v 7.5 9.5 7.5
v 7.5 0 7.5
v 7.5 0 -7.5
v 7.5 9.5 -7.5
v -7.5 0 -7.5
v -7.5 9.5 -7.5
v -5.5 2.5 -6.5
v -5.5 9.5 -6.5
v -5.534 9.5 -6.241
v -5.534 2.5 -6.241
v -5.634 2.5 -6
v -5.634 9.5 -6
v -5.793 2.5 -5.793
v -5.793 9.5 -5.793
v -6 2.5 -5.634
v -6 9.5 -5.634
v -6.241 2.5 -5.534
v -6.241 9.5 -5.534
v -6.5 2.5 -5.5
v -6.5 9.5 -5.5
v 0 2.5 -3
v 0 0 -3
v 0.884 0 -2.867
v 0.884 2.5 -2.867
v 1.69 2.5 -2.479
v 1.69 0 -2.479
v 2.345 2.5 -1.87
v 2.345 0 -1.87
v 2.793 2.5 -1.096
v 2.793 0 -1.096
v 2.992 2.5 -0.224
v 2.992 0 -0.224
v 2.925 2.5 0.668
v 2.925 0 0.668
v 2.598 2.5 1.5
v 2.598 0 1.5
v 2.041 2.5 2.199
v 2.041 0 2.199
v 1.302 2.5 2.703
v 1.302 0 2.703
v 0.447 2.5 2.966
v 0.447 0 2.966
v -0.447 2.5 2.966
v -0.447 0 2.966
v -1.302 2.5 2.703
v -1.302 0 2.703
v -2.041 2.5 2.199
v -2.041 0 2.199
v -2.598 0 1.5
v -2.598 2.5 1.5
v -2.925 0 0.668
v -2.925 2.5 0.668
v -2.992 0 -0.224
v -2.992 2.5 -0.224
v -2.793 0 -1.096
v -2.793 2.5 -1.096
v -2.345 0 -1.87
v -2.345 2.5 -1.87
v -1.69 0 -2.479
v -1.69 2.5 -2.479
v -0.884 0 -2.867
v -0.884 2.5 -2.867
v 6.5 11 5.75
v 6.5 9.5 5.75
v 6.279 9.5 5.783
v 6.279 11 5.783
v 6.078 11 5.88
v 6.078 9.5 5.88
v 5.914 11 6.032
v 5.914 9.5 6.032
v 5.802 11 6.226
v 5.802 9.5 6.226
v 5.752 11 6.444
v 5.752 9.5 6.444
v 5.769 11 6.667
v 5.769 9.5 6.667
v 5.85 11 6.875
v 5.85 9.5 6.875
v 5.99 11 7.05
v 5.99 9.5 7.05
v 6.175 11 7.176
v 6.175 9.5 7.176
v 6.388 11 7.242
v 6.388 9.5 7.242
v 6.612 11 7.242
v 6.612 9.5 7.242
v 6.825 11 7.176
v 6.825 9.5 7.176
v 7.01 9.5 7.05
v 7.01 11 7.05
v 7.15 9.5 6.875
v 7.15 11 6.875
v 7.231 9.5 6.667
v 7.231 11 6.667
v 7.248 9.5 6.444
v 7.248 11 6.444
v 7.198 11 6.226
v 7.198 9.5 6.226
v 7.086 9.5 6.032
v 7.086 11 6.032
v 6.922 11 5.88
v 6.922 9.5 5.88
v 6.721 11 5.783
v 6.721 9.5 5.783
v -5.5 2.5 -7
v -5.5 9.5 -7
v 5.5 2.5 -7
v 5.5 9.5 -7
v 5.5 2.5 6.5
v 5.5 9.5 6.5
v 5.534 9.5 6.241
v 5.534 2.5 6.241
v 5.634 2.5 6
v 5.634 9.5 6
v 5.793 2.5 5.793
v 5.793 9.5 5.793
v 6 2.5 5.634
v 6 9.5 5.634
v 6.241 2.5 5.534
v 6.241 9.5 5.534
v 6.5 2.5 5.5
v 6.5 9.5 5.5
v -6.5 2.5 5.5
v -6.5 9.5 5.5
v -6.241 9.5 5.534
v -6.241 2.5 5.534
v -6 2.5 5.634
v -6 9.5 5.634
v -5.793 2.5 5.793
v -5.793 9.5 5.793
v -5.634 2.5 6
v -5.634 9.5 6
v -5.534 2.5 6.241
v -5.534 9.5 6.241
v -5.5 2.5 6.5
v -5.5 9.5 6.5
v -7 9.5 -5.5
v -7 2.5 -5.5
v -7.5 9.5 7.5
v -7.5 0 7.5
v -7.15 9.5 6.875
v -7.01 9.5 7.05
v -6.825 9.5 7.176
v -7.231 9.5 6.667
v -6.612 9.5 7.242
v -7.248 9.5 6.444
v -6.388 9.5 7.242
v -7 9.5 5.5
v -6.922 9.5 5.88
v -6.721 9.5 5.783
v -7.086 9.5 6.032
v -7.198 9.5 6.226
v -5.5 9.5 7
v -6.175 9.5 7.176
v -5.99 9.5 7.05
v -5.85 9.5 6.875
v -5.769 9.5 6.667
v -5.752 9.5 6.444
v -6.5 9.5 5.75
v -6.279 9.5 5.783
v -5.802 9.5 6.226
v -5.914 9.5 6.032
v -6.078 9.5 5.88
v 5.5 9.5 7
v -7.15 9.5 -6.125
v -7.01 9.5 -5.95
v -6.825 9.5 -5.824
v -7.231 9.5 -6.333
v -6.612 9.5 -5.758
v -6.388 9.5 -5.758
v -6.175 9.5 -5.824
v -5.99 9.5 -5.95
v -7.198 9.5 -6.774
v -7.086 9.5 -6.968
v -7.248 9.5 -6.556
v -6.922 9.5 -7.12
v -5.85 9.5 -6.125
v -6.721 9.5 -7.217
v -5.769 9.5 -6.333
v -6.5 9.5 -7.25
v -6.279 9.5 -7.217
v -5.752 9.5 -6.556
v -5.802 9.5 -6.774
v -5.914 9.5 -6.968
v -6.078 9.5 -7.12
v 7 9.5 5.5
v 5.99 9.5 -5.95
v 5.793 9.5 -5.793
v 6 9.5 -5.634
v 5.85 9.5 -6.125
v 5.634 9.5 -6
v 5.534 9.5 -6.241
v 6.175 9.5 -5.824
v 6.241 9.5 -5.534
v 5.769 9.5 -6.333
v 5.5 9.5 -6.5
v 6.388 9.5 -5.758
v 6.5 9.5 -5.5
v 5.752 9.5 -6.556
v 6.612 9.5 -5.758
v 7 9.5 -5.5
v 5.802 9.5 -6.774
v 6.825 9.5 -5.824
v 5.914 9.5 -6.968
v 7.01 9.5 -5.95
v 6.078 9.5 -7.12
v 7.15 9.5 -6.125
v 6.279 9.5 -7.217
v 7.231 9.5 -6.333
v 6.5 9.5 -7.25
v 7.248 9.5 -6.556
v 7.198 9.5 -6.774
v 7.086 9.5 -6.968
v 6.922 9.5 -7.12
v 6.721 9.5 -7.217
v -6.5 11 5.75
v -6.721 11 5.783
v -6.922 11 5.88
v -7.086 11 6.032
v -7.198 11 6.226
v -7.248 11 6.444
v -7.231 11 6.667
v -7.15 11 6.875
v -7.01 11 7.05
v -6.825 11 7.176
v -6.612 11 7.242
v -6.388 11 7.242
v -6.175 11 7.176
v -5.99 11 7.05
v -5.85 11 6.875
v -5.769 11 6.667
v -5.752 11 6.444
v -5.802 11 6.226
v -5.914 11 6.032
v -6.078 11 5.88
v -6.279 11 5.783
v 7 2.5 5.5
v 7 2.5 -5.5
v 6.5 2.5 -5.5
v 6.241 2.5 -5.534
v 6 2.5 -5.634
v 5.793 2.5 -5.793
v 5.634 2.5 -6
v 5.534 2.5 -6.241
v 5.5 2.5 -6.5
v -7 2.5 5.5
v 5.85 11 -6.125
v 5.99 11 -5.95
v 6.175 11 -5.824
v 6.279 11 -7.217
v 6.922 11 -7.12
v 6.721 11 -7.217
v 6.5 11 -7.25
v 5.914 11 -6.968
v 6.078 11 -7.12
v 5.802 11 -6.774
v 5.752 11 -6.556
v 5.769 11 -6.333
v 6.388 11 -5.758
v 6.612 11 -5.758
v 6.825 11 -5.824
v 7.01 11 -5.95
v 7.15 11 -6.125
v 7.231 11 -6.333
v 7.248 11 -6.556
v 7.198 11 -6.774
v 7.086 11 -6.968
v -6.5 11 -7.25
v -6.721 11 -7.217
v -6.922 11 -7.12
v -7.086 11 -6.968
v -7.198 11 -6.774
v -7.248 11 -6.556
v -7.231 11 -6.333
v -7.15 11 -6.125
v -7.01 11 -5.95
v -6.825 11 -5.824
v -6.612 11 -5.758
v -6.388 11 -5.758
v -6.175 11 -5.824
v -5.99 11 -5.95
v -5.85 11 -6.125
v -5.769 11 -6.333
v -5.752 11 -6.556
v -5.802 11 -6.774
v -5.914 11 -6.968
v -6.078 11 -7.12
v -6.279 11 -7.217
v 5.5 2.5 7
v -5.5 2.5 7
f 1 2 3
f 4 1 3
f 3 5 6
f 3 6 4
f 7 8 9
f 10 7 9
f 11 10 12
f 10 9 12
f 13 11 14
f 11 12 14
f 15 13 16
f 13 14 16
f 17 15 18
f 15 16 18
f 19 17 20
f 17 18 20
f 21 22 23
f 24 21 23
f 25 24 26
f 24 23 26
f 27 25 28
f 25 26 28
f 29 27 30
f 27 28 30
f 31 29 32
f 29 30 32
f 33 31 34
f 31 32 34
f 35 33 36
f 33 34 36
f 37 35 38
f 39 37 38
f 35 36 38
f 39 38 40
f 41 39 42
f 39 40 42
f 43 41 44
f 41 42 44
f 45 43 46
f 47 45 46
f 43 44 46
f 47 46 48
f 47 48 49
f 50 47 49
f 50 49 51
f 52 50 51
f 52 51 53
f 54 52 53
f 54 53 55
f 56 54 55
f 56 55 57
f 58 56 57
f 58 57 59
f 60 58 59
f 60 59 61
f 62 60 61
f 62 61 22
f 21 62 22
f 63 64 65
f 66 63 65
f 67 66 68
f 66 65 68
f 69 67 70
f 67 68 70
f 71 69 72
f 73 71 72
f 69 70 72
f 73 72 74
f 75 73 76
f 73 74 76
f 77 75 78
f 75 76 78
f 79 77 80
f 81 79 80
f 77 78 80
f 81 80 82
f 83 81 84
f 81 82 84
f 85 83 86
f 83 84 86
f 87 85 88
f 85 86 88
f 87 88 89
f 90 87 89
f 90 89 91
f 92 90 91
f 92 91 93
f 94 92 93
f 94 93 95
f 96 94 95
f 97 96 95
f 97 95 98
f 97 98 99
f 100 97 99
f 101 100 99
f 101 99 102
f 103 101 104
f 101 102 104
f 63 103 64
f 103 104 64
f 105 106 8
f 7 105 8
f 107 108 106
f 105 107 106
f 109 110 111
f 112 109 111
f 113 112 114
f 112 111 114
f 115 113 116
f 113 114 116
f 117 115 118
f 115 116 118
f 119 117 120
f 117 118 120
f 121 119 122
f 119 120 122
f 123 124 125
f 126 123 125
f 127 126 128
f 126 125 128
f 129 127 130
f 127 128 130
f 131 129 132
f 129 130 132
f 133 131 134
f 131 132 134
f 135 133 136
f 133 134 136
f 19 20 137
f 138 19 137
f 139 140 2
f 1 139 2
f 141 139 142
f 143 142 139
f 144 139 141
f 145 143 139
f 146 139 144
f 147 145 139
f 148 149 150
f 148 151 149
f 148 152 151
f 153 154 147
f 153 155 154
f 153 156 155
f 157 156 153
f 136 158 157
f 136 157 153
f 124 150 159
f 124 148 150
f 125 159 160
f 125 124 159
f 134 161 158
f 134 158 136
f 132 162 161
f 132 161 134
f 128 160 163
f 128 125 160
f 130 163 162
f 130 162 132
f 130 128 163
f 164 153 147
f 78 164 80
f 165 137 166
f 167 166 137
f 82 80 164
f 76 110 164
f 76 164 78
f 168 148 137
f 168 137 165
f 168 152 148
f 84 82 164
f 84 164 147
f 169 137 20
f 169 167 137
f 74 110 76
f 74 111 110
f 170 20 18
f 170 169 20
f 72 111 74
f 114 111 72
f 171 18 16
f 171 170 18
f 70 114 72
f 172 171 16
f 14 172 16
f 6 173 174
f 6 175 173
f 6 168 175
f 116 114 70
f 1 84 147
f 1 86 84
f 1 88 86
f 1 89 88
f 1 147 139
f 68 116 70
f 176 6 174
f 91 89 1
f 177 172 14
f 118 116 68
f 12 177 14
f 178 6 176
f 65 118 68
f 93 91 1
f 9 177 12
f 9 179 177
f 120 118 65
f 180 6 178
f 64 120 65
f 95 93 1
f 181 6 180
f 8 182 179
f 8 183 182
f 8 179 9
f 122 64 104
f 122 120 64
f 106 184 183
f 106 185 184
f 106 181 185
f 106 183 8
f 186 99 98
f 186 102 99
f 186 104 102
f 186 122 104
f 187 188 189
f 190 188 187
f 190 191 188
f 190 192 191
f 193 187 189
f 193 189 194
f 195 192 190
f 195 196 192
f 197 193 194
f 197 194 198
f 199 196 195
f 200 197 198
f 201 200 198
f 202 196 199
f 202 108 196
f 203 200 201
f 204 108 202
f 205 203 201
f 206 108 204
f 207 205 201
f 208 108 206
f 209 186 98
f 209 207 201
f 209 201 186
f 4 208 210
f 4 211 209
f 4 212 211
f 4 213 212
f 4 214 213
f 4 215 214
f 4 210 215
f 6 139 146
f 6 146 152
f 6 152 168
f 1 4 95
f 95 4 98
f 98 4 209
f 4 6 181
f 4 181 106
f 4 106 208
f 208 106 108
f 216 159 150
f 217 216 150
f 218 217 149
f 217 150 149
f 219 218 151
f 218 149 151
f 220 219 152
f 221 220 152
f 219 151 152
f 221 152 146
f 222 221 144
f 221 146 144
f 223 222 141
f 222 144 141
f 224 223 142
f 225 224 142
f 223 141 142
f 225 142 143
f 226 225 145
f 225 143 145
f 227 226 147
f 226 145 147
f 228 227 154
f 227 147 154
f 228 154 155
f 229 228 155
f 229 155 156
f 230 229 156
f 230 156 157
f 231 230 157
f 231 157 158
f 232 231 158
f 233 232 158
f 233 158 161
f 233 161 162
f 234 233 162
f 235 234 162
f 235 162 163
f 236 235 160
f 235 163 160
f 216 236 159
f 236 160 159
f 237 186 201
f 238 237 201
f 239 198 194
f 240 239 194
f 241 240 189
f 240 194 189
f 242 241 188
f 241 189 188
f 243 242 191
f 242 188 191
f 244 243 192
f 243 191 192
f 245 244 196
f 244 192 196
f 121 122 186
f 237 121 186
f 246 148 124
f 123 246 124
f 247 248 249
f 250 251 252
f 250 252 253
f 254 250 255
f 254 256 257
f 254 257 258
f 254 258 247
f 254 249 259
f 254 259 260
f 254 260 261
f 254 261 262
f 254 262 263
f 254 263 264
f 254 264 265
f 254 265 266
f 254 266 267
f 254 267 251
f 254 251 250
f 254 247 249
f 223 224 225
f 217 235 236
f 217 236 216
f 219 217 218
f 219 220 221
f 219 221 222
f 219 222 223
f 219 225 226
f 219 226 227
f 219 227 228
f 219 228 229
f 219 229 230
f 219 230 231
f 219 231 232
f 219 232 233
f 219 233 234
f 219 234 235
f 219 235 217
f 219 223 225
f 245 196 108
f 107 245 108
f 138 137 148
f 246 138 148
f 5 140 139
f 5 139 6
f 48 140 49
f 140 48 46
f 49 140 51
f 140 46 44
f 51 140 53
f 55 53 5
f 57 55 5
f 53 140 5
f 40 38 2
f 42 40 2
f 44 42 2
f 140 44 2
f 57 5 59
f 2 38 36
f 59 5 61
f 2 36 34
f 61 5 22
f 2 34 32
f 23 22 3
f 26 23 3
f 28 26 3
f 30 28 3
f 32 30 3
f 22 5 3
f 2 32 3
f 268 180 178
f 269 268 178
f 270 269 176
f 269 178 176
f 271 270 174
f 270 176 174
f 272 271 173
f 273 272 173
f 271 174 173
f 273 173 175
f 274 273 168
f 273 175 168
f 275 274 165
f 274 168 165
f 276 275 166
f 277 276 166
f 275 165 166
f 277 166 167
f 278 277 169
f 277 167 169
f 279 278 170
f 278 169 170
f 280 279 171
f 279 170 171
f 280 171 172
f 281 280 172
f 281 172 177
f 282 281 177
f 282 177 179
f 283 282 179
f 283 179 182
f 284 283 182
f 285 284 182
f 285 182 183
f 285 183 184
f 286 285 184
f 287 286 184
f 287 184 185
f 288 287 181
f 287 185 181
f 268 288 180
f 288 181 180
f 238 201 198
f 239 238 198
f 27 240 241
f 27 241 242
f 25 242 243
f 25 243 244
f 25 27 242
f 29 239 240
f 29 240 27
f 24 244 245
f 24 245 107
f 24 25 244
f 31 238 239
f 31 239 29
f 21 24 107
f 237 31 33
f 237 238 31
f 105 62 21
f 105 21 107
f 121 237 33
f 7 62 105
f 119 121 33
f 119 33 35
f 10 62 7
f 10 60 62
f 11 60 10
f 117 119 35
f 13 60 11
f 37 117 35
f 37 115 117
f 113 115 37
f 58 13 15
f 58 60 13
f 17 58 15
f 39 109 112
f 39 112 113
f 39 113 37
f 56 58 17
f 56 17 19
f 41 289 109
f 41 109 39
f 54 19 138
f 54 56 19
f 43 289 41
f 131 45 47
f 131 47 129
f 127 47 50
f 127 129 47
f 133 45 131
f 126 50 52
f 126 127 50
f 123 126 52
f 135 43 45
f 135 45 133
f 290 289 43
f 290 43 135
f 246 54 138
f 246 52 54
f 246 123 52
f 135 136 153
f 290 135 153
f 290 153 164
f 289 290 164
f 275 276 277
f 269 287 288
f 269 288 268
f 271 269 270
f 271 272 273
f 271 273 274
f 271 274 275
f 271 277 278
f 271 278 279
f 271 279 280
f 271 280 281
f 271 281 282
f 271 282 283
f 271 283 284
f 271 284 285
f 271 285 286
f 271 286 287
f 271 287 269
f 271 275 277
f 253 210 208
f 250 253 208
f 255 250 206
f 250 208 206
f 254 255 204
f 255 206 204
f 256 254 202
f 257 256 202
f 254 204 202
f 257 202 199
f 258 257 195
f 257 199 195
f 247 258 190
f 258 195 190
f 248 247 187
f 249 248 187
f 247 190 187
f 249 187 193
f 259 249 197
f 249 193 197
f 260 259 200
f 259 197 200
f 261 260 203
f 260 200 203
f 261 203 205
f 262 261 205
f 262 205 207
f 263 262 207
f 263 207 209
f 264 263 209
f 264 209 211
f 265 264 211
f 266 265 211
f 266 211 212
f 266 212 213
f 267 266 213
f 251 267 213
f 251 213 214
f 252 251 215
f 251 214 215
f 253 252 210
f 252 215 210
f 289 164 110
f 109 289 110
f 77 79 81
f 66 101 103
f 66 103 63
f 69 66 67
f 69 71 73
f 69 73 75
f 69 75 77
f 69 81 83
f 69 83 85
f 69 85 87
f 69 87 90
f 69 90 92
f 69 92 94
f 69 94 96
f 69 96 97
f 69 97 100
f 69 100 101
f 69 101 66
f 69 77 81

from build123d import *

# Parameters (mm, degrees)
SKETCH_1_W          = 15
SKETCH_1_H          = 15
EXTRUDE_1_DEPTH     = 9.5
CUT_EXTRUDE_1_DEPTH = 7
SKETCH_5_R          = 0.75
EXTRUDE_2_DEPTH     = 1.5
CUT_EXTRUDE_2_REACH = 17.281
SKETCH_6_R          = 3


with BuildPart() as part:
    # 草图1 → 凸台-拉伸1 (new body)
    with BuildSketch(Plane(origin=(0, 0, 0), x_dir=(1, 0, 0), z_dir=(0, 1, 0))):
        Rectangle(SKETCH_1_W, SKETCH_1_H)
    extrude(amount=EXTRUDE_1_DEPTH)

    # 草图2 → 切除-拉伸1 (cut)
    with BuildSketch(Plane(origin=(0, 9.5, 0), x_dir=(-1, 0, 0), z_dir=(0, 1, 0))):
        with BuildLine():
            Line((6.5, -5.5), (7, -5.5))
            Line((7, -5.5), (7, 5.5))
            Line((7, 5.5), (6.5, 5.5))
            ThreePointArc((6.5, 5.5), (5.792893219, 5.792893219), (5.5, 6.5))
            Line((5.5, 6.5), (5.5, 7))
            Line((5.5, 7), (-5.5, 7))
            Line((-5.5, 7), (-5.5, 6.5))
            ThreePointArc((-5.5, 6.5), (-5.792893219, 5.792893219), (-6.5, 5.5))
            Line((-6.5, 5.5), (-7, 5.5))
            Line((-7, 5.5), (-7, -5.5))
            Line((-7, -5.5), (-6.5, -5.5))
            ThreePointArc((-6.5, -5.5), (-5.792893219, -5.792893219), (-5.5, -6.5))
            Line((-5.5, -6.5), (-5.5, -7))
            Line((-5.5, -7), (5.5, -7))
            Line((5.5, -7), (5.5, -6.5))
            ThreePointArc((5.5, -6.5), (5.792893219, -5.792893219), (6.5, -5.5))
        make_face()
    extrude(amount=-CUT_EXTRUDE_1_DEPTH, mode=Mode.SUBTRACT)

    # 草图5 → 凸台-拉伸2 (add)
    with BuildSketch(Plane(origin=(0, 9.5, 0), x_dir=(-1, 0, 0), z_dir=(0, 1, 0))):
        with Locations(Location((6.5, -6.5, 0), (0, 0, 270))):
            Circle(SKETCH_5_R)
        with Locations(Location((6.5, 6.5, 0), (0, 0, 270))):
            Circle(SKETCH_5_R)
        with Locations(Location((-6.5, 6.5, 0), (0, 0, 270))):
            Circle(SKETCH_5_R)
        with Locations(Location((-6.5, -6.5, 0), (0, 0, 270))):
            Circle(SKETCH_5_R)
    extrude(amount=EXTRUDE_2_DEPTH)

    # 草图6 → 切除-拉伸2 (cut, up to next)
    with BuildSketch(Plane.XZ, mode=Mode.PRIVATE) as cut_extrude_2_sk1:
        with Locations(Location((0, 0, 0), (0, 0, 270))):
            Circle(SKETCH_6_R)
    cut_extrude_2_tool1 = extrude(cut_extrude_2_sk1.sketch, amount=-CUT_EXTRUDE_2_REACH, mode=Mode.PRIVATE) & part.part
    add(cut_extrude_2_tool1.solids().sort_by_distance((0, 0, 0))[0], mode=Mode.SUBTRACT)


solid = part.part
